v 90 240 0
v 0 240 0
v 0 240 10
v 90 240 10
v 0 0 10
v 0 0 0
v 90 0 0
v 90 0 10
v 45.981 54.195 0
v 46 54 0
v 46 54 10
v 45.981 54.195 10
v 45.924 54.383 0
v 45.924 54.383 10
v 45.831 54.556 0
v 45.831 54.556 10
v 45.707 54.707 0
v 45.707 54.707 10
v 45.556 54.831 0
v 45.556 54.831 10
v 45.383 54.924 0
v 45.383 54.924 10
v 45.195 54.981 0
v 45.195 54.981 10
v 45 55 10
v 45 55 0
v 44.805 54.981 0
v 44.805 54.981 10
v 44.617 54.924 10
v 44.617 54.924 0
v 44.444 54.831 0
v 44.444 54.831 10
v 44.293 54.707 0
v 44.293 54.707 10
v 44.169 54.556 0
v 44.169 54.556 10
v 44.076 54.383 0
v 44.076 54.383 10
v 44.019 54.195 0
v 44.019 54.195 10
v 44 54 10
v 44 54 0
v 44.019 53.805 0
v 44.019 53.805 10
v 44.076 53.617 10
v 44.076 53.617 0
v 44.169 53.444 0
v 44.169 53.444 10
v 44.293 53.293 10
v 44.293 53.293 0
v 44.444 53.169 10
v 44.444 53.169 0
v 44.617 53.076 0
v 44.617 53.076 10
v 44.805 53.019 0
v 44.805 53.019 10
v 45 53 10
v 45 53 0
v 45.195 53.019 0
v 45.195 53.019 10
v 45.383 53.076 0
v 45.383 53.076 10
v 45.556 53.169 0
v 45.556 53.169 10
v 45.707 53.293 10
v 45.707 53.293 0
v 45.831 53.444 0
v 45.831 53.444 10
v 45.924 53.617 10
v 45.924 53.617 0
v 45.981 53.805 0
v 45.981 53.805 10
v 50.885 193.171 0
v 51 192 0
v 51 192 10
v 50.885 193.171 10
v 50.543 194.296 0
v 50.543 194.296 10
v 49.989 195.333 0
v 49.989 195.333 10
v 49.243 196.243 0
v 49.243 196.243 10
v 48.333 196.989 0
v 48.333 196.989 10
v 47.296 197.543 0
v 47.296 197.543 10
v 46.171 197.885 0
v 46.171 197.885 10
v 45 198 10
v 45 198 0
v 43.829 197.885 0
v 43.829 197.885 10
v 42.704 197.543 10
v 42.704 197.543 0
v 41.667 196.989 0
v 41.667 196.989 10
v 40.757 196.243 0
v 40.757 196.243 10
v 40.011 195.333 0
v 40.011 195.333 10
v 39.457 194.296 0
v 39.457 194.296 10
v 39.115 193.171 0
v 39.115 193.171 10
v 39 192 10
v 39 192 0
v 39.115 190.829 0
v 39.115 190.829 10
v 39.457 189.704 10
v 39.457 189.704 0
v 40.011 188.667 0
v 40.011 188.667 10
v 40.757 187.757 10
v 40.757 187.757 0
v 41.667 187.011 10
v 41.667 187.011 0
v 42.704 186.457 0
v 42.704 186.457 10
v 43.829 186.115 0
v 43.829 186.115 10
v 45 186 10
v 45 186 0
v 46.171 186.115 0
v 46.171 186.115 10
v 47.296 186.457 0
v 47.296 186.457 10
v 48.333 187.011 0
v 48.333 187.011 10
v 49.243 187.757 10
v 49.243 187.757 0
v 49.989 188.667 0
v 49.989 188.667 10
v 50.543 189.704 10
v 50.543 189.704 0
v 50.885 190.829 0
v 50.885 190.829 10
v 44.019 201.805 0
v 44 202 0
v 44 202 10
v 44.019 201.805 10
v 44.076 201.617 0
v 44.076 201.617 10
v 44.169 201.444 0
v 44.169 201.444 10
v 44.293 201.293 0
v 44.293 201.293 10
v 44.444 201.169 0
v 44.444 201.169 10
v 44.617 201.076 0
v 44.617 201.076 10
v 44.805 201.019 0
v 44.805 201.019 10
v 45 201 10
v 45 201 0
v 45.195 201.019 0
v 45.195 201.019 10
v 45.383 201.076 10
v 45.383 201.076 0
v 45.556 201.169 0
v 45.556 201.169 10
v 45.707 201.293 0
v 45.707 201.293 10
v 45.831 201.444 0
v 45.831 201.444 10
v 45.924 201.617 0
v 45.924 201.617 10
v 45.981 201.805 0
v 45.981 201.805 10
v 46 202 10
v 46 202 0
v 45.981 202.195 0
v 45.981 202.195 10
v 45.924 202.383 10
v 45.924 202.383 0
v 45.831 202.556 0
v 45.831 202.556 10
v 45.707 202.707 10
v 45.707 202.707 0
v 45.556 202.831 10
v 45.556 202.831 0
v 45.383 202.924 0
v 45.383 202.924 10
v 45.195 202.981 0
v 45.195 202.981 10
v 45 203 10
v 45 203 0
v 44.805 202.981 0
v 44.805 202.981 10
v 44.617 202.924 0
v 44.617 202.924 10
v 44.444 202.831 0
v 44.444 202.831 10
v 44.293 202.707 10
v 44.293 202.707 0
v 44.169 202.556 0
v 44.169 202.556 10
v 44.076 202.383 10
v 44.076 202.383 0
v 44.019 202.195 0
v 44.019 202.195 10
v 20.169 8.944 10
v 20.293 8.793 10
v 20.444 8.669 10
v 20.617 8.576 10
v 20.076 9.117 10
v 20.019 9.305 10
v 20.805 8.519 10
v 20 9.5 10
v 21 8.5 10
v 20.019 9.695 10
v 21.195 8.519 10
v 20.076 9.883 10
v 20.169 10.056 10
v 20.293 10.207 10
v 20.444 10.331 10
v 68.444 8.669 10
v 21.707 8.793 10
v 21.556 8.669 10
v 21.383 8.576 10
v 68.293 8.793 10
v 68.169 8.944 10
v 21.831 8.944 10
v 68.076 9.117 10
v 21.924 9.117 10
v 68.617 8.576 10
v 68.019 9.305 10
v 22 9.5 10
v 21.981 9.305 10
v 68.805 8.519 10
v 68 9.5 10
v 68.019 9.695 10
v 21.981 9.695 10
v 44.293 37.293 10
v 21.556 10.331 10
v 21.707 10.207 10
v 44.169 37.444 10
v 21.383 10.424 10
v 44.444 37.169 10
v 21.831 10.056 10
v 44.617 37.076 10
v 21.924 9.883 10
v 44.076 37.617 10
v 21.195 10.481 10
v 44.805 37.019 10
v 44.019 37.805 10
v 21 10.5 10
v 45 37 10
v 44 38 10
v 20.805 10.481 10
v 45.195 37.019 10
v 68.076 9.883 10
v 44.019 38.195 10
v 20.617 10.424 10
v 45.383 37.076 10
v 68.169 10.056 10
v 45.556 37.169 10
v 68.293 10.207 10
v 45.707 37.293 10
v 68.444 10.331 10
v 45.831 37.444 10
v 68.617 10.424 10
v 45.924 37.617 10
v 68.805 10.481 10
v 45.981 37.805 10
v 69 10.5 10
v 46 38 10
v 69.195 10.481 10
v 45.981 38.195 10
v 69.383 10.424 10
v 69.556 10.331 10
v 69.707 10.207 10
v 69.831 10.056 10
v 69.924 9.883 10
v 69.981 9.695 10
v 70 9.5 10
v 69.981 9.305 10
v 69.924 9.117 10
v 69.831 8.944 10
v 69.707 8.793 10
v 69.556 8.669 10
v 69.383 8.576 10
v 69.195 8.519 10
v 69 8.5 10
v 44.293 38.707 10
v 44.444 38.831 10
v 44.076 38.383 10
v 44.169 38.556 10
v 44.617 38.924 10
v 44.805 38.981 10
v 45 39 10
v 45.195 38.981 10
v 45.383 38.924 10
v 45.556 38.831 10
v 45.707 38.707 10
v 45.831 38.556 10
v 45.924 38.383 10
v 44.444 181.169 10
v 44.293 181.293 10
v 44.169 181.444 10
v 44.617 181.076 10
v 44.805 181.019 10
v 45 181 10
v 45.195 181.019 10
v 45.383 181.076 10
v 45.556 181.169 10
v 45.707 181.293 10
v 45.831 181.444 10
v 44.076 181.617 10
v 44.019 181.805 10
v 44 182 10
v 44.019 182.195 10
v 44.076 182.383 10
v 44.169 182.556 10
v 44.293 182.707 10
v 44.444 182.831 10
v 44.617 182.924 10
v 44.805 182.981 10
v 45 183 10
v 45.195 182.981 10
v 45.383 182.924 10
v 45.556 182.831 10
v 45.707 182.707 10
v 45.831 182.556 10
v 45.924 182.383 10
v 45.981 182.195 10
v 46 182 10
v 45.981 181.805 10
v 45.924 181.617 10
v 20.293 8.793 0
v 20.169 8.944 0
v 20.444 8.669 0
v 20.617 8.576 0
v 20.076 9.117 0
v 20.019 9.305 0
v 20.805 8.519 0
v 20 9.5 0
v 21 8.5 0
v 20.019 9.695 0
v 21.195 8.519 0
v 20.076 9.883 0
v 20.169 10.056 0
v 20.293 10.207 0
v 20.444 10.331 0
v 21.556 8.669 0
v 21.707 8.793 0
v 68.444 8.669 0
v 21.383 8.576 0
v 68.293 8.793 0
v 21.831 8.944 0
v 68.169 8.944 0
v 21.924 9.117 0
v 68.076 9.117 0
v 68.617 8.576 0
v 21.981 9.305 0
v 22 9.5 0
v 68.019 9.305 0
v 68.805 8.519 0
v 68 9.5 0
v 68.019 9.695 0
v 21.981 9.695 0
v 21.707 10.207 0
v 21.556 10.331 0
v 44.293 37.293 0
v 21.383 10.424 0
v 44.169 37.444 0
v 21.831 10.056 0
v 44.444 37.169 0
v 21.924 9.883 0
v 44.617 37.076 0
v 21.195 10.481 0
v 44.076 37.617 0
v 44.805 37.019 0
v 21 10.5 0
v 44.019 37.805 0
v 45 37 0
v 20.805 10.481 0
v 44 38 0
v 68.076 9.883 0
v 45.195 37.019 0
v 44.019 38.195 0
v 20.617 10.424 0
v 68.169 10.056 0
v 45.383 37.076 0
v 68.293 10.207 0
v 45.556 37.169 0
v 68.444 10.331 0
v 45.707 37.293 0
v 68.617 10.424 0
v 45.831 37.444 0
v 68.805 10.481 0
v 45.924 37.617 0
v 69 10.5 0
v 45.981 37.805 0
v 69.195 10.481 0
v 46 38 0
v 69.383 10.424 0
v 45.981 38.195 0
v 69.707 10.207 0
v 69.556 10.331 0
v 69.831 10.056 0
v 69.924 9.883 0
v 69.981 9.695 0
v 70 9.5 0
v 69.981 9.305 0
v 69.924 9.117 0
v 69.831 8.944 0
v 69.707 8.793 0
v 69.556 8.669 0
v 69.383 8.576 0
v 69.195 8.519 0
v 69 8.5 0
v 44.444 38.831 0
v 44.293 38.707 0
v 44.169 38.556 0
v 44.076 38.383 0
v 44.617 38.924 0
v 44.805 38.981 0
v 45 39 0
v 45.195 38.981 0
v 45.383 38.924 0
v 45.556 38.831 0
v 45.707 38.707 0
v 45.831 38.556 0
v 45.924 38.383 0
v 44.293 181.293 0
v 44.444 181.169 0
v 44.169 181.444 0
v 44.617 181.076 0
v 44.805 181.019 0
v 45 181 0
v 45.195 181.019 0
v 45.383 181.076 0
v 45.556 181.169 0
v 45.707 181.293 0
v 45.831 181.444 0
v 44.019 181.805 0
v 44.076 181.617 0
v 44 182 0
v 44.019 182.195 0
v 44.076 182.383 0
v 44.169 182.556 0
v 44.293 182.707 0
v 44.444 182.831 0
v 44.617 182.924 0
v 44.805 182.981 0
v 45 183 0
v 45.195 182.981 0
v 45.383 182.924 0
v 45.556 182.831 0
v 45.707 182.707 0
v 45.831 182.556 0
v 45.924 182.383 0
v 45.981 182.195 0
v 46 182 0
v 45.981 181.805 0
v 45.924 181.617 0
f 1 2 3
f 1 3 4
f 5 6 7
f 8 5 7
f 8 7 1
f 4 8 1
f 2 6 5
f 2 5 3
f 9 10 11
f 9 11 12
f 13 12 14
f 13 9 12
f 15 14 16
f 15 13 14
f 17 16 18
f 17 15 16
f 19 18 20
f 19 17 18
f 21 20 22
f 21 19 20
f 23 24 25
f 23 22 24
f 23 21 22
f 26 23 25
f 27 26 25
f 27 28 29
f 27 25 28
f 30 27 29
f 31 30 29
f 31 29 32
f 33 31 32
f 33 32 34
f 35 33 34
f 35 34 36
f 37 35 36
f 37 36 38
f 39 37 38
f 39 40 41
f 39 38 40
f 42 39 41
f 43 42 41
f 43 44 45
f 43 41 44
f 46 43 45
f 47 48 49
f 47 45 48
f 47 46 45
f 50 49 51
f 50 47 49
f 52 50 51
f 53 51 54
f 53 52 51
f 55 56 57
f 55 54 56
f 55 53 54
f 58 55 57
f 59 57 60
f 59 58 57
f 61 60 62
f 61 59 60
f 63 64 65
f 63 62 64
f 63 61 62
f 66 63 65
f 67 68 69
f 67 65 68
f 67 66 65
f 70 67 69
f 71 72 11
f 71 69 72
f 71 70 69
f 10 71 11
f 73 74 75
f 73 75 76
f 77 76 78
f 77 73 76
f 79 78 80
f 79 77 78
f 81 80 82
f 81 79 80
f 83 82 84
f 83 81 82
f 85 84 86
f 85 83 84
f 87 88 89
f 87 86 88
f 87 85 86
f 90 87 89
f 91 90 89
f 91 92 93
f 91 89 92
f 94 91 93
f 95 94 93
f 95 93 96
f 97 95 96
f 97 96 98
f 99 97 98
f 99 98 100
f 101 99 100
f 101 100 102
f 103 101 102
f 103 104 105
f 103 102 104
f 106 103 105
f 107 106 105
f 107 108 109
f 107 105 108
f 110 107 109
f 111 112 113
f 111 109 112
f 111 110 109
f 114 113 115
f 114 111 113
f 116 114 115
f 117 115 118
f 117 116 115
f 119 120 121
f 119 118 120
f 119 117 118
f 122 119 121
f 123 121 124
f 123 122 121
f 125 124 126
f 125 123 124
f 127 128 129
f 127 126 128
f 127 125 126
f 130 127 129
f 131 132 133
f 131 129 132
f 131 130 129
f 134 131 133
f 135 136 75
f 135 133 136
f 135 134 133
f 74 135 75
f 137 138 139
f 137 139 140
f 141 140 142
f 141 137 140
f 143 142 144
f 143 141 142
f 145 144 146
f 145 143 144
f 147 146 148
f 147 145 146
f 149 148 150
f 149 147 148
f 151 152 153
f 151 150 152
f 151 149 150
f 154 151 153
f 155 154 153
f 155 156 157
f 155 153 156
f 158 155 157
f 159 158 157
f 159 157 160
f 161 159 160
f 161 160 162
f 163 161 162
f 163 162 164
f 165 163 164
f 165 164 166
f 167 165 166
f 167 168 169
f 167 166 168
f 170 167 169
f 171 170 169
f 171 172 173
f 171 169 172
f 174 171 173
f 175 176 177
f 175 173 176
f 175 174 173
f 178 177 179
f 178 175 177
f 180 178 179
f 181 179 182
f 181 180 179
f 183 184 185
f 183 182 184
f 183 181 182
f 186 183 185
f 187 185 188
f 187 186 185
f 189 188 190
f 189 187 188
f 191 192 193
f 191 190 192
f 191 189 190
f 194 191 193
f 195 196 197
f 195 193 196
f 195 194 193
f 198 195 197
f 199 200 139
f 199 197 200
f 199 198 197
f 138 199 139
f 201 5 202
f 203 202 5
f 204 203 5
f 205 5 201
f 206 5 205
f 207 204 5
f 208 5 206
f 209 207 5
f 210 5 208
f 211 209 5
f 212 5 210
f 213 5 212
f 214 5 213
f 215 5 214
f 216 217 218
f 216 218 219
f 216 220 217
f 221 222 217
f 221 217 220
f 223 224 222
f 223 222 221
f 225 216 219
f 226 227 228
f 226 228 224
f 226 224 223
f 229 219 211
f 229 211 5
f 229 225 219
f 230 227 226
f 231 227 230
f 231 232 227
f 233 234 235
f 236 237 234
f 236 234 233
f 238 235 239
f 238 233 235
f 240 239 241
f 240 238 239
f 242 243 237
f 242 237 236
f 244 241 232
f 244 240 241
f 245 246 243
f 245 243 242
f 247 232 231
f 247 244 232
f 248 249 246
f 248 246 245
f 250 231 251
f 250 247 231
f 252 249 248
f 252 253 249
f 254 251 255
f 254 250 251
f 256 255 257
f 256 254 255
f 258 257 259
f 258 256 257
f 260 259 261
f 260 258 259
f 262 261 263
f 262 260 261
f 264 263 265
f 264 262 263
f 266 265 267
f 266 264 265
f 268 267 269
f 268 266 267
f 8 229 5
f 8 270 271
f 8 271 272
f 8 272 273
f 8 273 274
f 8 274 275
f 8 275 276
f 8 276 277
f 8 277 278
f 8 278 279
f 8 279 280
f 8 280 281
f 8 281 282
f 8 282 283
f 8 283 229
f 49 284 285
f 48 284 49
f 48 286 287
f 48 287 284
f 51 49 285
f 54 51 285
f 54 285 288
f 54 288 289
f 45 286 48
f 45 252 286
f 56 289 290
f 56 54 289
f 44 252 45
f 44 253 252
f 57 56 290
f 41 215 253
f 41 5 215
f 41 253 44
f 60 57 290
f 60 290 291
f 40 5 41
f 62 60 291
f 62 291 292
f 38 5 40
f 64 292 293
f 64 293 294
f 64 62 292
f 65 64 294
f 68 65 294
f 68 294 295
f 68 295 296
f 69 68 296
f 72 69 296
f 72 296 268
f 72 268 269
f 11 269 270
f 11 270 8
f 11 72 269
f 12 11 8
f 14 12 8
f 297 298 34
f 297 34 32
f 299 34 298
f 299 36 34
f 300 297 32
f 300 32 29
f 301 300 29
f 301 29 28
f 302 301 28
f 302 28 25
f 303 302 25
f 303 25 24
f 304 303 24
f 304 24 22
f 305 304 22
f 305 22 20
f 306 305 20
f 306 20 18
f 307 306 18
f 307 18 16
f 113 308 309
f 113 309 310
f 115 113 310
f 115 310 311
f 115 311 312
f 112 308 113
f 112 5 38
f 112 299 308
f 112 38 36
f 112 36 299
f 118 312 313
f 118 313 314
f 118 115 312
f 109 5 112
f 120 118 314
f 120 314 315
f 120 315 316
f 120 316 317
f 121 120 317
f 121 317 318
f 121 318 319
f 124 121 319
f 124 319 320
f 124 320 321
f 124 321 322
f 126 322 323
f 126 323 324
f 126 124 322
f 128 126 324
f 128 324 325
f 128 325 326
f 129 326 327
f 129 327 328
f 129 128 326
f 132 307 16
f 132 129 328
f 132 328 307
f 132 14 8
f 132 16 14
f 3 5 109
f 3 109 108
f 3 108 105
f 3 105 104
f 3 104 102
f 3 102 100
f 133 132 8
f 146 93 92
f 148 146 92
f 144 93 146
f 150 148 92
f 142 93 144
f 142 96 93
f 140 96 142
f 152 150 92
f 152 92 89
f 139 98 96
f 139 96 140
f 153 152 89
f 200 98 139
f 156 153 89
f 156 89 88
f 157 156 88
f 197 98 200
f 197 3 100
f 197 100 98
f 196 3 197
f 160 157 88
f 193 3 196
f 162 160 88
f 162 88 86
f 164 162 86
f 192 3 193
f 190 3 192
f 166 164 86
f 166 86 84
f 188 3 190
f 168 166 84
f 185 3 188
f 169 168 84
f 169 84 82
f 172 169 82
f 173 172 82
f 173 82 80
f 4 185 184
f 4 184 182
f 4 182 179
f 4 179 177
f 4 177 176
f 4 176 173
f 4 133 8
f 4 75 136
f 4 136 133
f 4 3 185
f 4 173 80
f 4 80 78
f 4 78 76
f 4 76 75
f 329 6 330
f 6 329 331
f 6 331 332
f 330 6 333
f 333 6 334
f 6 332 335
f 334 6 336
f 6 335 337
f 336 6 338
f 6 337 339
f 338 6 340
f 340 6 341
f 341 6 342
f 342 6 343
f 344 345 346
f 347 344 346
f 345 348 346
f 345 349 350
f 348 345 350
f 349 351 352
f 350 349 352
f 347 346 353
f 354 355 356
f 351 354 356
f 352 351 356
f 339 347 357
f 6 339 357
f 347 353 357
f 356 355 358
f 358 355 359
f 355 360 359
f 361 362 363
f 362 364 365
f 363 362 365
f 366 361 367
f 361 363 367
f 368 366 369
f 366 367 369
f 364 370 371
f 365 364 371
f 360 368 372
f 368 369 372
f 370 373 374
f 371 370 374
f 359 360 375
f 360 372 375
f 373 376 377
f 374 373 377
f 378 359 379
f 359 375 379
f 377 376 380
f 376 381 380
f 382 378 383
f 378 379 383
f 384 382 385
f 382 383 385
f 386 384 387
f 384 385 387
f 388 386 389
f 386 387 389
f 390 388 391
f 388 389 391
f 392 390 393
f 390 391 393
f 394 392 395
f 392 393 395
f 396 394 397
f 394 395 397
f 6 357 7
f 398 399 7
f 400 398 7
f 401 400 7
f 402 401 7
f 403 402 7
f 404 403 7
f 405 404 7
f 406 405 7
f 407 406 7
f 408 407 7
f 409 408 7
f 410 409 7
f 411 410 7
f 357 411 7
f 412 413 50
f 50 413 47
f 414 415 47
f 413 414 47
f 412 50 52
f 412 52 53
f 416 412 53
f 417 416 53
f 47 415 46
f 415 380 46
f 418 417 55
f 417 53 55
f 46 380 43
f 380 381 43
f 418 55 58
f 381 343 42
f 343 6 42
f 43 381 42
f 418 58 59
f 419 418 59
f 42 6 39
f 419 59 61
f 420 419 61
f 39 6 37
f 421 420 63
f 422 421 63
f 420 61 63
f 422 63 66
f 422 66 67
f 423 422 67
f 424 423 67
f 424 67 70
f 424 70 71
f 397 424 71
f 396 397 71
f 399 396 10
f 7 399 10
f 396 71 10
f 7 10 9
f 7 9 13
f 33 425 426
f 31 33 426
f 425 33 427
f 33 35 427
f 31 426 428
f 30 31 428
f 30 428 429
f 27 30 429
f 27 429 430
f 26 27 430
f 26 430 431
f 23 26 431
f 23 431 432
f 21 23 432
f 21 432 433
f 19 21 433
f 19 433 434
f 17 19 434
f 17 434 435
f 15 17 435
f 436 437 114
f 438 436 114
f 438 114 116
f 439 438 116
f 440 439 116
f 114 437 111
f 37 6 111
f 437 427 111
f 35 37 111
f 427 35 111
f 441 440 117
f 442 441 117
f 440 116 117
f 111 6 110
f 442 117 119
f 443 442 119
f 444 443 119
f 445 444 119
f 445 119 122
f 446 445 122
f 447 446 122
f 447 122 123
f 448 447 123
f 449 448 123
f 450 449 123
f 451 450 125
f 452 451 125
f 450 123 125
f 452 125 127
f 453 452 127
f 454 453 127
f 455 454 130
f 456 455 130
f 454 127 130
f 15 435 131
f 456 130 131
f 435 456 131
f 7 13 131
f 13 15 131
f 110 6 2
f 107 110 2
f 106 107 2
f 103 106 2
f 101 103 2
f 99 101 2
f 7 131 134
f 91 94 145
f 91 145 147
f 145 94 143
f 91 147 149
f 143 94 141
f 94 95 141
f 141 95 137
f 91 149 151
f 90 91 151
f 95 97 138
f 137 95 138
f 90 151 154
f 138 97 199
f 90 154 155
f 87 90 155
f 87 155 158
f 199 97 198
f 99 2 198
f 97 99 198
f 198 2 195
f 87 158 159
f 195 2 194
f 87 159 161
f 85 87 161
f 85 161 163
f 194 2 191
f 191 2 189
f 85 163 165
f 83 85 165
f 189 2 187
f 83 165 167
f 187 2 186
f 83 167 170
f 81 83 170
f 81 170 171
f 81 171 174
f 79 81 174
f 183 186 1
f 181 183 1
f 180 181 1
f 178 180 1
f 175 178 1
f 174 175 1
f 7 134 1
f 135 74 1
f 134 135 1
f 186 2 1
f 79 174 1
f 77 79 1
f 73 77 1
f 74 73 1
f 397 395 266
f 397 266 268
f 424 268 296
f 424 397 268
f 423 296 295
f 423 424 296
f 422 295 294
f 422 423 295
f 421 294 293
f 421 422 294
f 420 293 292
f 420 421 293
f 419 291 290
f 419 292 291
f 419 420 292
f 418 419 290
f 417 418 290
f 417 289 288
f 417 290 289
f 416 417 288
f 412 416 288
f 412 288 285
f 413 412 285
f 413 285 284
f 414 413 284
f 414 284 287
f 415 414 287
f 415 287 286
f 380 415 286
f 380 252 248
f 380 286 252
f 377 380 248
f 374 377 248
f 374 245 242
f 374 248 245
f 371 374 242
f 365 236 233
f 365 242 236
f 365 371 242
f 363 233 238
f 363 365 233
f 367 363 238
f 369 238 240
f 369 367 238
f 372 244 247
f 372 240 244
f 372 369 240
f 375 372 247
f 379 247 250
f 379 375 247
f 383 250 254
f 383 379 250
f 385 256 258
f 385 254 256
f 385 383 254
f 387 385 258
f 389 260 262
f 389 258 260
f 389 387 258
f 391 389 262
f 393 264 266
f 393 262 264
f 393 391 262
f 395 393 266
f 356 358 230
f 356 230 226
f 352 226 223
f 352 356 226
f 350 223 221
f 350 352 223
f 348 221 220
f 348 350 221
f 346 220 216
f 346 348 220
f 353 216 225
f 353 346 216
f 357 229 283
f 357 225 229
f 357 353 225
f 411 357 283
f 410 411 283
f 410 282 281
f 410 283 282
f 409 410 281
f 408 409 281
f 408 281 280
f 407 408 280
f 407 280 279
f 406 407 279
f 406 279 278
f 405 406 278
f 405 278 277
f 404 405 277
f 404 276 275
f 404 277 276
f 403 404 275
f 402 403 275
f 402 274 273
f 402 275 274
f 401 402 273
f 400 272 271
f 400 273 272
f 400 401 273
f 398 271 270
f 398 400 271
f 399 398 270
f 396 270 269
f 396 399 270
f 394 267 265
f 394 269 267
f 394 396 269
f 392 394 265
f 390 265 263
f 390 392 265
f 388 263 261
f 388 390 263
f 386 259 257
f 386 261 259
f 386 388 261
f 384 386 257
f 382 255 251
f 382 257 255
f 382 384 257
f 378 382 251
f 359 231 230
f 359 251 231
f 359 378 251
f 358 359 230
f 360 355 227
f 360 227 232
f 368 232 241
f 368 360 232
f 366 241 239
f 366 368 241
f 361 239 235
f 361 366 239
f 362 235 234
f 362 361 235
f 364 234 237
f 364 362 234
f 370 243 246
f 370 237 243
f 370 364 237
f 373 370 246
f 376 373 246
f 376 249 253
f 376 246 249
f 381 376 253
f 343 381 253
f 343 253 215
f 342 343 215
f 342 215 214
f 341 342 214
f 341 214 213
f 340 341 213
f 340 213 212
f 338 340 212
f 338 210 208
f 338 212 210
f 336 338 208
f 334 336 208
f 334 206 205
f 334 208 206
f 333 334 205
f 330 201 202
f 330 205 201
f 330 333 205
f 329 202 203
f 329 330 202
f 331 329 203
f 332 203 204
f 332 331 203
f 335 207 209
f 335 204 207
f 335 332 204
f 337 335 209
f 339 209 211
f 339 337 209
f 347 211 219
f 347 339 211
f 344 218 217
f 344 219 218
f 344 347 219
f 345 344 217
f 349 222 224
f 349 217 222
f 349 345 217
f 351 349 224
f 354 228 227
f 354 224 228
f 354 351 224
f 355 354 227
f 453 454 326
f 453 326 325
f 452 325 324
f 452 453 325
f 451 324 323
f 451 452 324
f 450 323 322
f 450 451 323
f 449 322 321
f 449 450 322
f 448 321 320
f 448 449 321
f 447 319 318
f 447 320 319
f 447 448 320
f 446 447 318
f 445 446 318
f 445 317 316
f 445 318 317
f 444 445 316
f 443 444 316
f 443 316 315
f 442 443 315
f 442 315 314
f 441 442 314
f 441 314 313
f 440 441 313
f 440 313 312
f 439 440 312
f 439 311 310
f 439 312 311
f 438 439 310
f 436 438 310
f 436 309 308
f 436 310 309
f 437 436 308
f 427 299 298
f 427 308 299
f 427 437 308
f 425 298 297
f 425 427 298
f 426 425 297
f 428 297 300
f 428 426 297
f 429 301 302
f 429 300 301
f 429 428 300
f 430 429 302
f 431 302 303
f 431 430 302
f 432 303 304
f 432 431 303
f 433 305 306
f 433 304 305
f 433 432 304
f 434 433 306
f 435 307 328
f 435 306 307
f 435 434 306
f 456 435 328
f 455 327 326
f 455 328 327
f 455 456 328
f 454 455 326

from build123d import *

# Parameters (mm, degrees)
ESQUISSE1_W                  = 90
ESQUISSE1_H                  = 240
BOSS_EXTRU_1_DEPTH           = 10
ENL_V_MAT_EXTRU_1_DEPTH      = 257.515106768
ENL_V_MAT_EXTRU_1_DEPTH_BACK = 257.515106768
ESQUISSE2_R                  = 1
ESQUISSE2_R_2                = 6


with BuildPart() as part:
    # Esquisse1 → Boss.-Extru.1 (new body)
    with BuildSketch(Plane.XY):
        with Locations((45, 120)):
            Rectangle(ESQUISSE1_W, ESQUISSE1_H)
    extrude(amount=BOSS_EXTRU_1_DEPTH)

    # Esquisse2 → Enlèv. mat.-Extru.1 (cut, two sides: drawn at the far end of the back side and taken through both)
    with BuildSketch(Plane.XY.offset(10).offset(-ENL_V_MAT_EXTRU_1_DEPTH_BACK)):
        with Locations((45, 54)):
            Circle(ESQUISSE2_R)
        with Locations((45, 38)):
            Circle(ESQUISSE2_R)
        with Locations((21, 9.5)):
            Circle(ESQUISSE2_R)
        with Locations(Location((69, 9.5, 0), (0, 0, 180))):
            Circle(ESQUISSE2_R)
        with Locations((45, 192)):
            Circle(ESQUISSE2_R_2)
        with Locations((45, 182)):
            Circle(ESQUISSE2_R)
        with Locations(Location((45, 202, 0), (0, 0, 180))):
            Circle(ESQUISSE2_R)
    extrude(amount=ENL_V_MAT_EXTRU_1_DEPTH + ENL_V_MAT_EXTRU_1_DEPTH_BACK, mode=Mode.SUBTRACT)


solid = part.part
